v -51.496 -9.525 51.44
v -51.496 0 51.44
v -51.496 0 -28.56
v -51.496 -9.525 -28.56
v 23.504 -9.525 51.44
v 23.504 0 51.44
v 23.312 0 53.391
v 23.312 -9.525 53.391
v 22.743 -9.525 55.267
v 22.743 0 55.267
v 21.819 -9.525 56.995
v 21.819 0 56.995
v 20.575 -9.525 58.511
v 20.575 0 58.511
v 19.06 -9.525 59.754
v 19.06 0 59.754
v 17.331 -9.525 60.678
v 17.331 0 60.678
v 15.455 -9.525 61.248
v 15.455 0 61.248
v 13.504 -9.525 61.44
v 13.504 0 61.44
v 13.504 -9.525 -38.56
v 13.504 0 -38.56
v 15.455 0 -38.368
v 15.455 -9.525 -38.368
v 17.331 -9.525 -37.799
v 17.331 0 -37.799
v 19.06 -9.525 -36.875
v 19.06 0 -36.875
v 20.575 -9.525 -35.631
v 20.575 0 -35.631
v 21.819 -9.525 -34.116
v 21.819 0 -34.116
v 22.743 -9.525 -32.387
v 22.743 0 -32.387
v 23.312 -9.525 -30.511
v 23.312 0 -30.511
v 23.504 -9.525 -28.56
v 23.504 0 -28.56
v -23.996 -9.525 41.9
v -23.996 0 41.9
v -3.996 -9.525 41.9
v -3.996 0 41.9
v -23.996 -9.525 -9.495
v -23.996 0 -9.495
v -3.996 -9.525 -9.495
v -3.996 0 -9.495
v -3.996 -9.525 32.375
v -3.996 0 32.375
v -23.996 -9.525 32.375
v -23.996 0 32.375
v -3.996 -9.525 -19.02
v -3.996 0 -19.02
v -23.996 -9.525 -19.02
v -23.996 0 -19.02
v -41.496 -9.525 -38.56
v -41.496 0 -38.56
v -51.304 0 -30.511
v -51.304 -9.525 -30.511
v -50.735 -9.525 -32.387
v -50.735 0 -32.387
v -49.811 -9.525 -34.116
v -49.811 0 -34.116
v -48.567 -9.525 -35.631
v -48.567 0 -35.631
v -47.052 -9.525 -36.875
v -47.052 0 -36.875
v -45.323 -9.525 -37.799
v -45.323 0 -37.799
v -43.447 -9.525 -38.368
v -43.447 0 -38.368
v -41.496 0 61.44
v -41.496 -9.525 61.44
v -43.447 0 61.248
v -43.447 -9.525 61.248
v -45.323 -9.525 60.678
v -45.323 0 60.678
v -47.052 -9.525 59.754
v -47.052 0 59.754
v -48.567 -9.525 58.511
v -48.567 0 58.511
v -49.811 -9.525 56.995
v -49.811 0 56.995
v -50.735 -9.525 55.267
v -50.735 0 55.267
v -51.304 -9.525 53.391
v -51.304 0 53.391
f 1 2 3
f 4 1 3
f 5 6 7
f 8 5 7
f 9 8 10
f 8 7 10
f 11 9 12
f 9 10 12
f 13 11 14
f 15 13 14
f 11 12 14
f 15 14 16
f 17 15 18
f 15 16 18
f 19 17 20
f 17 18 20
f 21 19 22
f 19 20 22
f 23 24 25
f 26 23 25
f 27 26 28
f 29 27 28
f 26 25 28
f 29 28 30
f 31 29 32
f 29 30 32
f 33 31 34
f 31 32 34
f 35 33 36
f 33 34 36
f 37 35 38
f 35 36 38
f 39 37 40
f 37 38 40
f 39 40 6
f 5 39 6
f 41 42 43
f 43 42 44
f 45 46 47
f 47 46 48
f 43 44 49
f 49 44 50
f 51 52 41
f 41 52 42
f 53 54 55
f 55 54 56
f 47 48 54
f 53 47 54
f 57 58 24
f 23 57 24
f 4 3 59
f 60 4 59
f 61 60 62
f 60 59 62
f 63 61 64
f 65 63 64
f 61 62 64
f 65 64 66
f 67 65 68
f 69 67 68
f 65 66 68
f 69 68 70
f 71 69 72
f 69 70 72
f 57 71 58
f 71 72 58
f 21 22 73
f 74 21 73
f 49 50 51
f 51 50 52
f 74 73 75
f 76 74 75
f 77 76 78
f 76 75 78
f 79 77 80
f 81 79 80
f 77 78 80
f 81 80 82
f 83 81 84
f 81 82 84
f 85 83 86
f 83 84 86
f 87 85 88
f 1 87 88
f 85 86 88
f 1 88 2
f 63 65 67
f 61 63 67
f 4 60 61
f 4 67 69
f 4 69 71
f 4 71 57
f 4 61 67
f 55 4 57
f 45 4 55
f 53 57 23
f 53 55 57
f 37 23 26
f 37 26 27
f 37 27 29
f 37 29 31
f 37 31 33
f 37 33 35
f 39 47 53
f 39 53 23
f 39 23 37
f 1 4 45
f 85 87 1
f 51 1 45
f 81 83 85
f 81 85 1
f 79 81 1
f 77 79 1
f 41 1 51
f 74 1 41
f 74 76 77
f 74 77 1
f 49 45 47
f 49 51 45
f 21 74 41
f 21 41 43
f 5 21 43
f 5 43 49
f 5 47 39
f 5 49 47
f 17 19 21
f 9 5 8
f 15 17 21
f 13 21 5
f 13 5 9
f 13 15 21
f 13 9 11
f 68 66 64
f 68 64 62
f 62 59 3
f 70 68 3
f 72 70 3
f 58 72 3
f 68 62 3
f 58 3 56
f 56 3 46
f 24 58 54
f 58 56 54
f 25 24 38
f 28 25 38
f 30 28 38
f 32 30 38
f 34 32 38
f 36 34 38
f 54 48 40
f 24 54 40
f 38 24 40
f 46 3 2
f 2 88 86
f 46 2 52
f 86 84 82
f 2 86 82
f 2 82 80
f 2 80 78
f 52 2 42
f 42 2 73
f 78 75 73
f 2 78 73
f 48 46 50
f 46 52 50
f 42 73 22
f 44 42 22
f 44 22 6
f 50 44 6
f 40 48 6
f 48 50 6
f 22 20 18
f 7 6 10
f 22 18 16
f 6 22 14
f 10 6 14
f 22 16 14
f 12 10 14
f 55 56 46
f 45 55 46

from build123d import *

# Parameters (mm, degrees)
F1_DEPTH = 9.525


with BuildPart() as f1:
    # F0 (on Front) → F1 (new body)
    with BuildSketch(Plane.XZ):
        with BuildLine():
            Line((13.503937, 61.43969), (-41.496063, 61.43969))
            ThreePointArc((-41.496063, 61.43969), (-48.567131, 58.510758), (-51.496063, 51.43969))
            Line((-51.496063, 51.43969), (-51.496063, -28.56031))
            ThreePointArc((-51.496063, -28.56031), (-48.567131, -35.631378), (-41.496063, -38.56031))
            Line((-41.496063, -38.56031), (13.503937, -38.56031))
            ThreePointArc((13.503937, -38.56031), (20.575005, -35.631378), (23.503937, -28.56031))
            Line((23.503937, -28.56031), (23.503937, 51.43969))
            ThreePointArc((23.503937, 51.43969), (20.575005, 58.510758), (13.503937, 61.43969))
        make_face()
        Polygon((-23.996063, -9.495226), (-3.996063, -9.495226), (-3.996063, -19.020226), (-13.996063, -19.020226), (-23.996063, -19.020226), align=None, mode=Mode.SUBTRACT)
        Polygon((-23.996063, 41.899607), (-13.996063, 41.899607), (-3.996063, 41.899607), (-3.996063, 32.374607), (-23.996063, 32.374607), align=None, mode=Mode.SUBTRACT)
    extrude(amount=F1_DEPTH)


solid = f1.part
